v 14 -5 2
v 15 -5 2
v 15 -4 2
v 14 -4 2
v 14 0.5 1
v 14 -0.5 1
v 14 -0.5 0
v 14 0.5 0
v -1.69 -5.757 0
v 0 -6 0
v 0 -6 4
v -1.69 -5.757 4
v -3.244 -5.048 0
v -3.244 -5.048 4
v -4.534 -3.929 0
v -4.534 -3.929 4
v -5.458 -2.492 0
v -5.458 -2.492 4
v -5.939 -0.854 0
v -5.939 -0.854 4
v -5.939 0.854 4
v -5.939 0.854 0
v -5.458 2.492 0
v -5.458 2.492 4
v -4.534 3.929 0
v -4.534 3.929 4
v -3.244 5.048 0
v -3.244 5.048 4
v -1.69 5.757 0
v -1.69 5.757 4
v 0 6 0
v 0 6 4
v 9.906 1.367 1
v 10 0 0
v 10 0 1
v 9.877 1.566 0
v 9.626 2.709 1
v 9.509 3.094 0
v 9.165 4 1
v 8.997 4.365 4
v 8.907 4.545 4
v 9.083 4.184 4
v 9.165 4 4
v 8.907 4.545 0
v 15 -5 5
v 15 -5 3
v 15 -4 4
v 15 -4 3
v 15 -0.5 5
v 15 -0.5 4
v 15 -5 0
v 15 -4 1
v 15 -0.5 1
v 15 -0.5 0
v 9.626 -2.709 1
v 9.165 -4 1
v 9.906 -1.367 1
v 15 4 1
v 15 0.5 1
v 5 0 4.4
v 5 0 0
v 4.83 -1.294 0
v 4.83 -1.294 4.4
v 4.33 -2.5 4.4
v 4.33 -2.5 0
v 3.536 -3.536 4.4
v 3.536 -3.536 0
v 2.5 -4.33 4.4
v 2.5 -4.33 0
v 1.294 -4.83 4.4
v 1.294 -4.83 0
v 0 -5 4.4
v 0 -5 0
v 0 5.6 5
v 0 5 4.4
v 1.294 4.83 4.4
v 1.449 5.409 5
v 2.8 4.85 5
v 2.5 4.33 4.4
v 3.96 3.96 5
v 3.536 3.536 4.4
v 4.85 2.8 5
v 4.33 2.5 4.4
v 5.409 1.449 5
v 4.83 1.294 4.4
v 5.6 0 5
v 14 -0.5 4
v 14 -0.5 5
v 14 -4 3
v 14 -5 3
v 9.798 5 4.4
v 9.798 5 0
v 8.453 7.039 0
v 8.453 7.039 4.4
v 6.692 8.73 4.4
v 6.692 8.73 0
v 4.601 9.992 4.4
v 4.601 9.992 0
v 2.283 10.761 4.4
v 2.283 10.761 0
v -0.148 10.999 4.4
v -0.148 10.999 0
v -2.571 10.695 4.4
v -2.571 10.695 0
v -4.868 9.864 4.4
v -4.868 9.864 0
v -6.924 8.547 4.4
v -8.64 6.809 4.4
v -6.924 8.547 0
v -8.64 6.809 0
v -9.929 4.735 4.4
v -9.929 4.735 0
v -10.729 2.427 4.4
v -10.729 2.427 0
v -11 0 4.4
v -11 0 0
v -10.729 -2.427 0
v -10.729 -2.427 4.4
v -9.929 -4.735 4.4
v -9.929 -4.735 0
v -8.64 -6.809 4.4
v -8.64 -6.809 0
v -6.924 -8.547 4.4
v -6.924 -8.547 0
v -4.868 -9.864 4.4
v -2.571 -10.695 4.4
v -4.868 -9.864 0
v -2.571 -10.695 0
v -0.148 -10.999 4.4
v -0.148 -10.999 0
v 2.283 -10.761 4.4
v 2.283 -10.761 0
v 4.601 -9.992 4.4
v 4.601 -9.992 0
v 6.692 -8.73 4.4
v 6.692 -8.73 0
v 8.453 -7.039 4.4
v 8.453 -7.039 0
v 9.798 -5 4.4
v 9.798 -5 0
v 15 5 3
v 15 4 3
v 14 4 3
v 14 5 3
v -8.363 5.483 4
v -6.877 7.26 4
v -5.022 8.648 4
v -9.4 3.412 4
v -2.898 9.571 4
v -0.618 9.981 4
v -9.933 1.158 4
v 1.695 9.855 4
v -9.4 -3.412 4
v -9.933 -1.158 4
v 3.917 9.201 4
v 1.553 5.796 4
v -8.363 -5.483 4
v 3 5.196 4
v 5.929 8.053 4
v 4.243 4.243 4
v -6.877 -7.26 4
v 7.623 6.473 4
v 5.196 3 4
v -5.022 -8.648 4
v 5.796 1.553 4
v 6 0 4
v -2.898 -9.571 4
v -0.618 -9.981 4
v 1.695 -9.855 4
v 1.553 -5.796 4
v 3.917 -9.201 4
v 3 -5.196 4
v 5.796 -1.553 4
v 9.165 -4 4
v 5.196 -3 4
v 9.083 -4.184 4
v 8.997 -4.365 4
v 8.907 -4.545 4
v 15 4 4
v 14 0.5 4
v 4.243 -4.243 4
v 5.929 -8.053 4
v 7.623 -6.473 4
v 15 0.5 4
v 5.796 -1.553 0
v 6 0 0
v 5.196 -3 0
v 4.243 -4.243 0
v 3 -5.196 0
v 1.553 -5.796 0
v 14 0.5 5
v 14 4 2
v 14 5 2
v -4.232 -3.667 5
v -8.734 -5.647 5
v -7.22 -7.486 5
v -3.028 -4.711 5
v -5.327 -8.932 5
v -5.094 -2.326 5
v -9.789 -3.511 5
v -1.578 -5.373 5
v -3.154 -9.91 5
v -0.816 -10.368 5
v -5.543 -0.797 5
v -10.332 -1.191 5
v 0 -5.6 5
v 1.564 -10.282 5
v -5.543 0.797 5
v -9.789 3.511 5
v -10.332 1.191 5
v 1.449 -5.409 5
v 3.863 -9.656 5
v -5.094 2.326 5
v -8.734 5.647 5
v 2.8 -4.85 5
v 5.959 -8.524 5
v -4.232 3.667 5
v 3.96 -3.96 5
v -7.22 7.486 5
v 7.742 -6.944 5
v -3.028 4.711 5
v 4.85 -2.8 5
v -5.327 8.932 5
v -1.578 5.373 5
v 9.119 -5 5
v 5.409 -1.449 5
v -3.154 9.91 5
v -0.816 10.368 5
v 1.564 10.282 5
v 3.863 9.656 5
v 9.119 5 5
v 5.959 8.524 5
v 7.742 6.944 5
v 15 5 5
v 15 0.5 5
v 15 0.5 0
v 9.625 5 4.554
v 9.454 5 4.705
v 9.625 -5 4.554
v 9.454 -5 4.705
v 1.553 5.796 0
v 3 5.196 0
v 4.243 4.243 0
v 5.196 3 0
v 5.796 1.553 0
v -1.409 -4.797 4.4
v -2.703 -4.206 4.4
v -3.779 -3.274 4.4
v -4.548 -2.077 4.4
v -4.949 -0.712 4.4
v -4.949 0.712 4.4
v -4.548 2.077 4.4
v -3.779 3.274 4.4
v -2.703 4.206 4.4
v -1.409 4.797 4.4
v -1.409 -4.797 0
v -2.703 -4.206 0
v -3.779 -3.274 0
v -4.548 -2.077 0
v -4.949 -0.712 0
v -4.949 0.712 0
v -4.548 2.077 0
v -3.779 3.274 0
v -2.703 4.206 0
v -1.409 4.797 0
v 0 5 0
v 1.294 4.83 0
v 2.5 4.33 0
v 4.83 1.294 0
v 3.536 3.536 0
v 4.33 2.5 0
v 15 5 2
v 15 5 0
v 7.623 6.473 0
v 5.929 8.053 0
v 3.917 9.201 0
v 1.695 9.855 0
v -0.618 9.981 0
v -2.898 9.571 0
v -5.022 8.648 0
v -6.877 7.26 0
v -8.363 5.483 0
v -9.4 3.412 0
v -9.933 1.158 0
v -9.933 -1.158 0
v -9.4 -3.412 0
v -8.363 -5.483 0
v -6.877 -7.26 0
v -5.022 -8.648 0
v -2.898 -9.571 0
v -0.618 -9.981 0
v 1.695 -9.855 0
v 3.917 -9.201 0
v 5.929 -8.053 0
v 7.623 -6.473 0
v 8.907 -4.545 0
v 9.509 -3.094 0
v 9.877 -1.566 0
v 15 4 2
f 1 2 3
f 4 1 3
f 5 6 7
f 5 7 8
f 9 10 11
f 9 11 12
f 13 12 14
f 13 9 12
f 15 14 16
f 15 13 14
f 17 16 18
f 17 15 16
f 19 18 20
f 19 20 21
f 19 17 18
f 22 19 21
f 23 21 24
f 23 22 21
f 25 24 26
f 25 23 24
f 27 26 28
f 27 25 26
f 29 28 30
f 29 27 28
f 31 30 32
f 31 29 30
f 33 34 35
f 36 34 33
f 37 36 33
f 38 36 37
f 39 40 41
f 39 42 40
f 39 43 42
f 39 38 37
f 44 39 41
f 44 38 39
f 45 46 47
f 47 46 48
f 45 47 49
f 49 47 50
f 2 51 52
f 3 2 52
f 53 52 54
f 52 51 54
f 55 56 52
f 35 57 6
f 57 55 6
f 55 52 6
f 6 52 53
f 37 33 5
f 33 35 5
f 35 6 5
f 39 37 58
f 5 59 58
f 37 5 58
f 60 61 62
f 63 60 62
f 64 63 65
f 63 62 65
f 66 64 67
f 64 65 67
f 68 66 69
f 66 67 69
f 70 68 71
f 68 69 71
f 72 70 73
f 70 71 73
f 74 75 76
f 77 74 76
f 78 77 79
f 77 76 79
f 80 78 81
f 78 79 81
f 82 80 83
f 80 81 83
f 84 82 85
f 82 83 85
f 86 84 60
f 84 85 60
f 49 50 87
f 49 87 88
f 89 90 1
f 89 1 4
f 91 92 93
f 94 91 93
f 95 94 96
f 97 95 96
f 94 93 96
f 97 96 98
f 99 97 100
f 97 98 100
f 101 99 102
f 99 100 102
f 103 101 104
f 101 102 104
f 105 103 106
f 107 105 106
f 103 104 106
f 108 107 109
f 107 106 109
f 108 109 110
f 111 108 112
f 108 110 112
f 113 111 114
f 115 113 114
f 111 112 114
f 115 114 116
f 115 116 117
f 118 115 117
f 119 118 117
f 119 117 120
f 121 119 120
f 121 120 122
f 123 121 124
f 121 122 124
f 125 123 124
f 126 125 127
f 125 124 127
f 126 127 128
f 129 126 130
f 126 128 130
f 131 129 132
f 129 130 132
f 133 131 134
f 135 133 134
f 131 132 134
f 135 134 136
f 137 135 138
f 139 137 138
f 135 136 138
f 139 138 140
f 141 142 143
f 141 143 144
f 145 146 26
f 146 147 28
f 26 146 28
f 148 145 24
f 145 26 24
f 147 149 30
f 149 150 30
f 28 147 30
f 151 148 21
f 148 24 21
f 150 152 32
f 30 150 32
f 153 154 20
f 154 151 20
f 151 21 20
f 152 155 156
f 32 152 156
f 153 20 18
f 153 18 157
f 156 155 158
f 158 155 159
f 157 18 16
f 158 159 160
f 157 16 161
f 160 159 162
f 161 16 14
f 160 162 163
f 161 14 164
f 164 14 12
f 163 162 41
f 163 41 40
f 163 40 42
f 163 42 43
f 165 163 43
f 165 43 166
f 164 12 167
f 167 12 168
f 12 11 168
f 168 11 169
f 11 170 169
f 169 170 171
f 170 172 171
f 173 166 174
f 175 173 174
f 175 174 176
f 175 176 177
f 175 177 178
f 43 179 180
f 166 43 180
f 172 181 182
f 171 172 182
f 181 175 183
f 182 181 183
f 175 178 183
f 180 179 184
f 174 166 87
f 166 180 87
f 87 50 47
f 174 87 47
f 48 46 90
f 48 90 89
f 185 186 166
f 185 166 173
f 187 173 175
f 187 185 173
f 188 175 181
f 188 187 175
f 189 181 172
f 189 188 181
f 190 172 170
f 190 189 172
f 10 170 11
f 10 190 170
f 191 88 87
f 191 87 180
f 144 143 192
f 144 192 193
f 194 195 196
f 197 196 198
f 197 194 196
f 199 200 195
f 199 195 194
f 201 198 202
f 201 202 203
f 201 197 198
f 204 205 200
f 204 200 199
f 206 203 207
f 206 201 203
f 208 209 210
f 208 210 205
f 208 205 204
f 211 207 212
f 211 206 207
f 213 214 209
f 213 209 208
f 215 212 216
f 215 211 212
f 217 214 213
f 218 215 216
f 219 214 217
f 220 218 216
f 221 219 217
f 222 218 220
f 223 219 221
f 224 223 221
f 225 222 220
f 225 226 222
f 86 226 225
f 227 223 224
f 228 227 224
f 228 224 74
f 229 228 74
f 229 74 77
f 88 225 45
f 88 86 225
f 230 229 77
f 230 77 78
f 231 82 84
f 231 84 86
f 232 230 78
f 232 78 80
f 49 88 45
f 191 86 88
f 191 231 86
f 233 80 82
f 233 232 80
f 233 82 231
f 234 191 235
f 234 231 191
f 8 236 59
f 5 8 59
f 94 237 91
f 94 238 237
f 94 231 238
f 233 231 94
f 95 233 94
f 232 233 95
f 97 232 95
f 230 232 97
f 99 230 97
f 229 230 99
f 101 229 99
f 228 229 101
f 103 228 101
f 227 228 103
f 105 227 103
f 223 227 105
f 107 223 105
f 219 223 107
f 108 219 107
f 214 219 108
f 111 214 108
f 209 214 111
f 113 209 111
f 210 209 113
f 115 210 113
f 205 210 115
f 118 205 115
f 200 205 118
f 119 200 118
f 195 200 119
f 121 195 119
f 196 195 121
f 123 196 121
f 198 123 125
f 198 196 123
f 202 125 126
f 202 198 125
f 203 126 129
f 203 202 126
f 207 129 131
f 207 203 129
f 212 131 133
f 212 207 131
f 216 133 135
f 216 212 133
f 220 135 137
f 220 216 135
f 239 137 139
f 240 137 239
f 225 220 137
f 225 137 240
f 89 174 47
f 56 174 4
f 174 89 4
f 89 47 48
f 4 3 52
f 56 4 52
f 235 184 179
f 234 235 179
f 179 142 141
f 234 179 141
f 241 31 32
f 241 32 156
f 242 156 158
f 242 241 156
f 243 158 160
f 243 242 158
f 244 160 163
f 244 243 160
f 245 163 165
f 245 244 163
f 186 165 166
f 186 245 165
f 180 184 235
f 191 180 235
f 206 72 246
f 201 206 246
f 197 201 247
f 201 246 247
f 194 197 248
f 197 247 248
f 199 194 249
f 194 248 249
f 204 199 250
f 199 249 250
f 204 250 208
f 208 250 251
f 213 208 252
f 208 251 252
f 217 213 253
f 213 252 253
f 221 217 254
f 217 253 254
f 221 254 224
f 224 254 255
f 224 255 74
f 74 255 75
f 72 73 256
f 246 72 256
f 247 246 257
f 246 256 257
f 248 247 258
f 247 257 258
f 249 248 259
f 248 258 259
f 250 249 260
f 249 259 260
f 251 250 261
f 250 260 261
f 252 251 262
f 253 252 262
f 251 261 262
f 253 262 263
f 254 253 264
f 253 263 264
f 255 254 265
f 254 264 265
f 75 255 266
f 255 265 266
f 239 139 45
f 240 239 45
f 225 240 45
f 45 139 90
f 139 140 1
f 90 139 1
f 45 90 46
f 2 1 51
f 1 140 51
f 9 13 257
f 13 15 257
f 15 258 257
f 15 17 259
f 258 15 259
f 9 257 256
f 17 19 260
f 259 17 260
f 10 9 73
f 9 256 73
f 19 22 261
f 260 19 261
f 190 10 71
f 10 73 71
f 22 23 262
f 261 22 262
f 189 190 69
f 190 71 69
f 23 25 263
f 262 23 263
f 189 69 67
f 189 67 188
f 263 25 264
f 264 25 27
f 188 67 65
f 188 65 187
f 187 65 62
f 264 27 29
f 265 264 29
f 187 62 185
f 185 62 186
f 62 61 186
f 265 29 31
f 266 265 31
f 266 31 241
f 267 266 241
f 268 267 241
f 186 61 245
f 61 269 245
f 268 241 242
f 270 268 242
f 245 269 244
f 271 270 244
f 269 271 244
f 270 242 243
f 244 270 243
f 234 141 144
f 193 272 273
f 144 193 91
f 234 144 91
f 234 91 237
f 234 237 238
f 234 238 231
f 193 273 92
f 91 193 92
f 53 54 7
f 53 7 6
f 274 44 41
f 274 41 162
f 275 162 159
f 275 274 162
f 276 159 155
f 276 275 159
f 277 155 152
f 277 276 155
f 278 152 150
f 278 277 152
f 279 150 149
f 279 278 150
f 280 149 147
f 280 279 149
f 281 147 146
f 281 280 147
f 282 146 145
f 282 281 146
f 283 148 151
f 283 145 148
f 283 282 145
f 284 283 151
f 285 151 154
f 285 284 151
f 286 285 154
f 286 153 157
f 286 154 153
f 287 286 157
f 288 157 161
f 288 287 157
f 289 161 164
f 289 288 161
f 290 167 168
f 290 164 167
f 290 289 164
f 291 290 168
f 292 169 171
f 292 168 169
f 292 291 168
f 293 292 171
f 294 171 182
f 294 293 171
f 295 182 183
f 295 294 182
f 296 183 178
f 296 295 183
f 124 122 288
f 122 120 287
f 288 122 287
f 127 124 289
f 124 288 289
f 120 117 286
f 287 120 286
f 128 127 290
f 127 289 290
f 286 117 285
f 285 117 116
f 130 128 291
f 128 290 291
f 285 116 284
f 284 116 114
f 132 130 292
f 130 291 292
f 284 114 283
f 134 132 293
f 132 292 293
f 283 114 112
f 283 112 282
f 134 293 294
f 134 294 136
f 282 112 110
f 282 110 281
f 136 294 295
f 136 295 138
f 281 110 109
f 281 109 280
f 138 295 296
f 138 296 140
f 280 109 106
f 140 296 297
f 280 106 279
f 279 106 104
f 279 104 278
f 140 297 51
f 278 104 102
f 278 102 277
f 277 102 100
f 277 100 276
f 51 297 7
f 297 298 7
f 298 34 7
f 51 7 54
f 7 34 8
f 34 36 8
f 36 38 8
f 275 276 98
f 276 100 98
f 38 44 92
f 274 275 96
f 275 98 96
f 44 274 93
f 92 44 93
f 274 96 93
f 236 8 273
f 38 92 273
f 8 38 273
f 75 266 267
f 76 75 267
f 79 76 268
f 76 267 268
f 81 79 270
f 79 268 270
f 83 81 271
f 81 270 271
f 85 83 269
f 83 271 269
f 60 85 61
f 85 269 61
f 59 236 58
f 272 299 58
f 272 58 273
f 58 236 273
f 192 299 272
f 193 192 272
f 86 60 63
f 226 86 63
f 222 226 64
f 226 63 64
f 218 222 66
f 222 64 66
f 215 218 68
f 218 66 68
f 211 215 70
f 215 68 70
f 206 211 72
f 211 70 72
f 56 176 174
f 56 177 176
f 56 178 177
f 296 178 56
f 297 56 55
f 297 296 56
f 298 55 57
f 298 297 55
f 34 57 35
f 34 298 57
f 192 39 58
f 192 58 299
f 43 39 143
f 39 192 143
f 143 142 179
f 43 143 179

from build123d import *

# Parameters (mm, degrees)
F1_DEPTH = 5
F2_T     = -1
F3_DEPTH = 5
F5_DEPTH = 5.8358486101
F6_SIZE  = 0.6
F4_W     = 1
F4_H     = 1
F7_DEPTH = 1


with BuildPart() as f1:
    # F0 (on Top) → F1 (new body)
    with BuildSketch(Plane.XY):
        with BuildLine():
            ThreePointArc((0, -5), (-5, 0), (0, 5))
            Line((0, 5), (9.7979589711, 5))
            ThreePointArc((9.7979589711, 5), (-11, 0), (9.7979589711, -5))
            Line((9.7979589711, -5), (0, -5))
        make_face()
        with BuildLine():
            ThreePointArc((0, 5), (3.5355339059, 3.5355339059), (5, 0))
            ThreePointArc((5, 0), (3.5355339059, -3.5355339059), (0, -5))
            Line((0, -5), (9.7979589711, -5))
            ThreePointArc((9.7979589711, -5), (10.695268783, -2.5712303784), (11, 0))
            ThreePointArc((11, 0), (10.695268783, 2.5712303784), (9.7979589711, 5))
            Line((9.7979589711, 5), (0, 5))
        make_face()
    extrude(amount=F1_DEPTH)

    # F2
    f2_openings = [f1.faces().sort_by_distance(p)[0] for p in [
        (-9.520831, 4.858579, 0),
    ]]
    offset(amount=F2_T, openings=f2_openings)

    # F0 (on Top) → F3 (join)
    with BuildSketch(Plane.XY):
        with BuildLine():
            Line((15, 5), (9.7979589711, 5))
            ThreePointArc((9.7979589711, 5), (10.695268783, 2.5712303784), (11, 0))
            ThreePointArc((11, 0), (10.695268783, -2.5712303784), (9.7979589711, -5))
            Line((9.7979589711, -5), (15, -5))
            Line((15, -5), (15, 5))
        make_face()
    extrude(amount=F3_DEPTH)

    # F4 (on face) → F5 (cut, through all)
    with BuildSketch(Plane.YZ.offset(15)):
        Polygon((-4, 2), (-4, 1), (-0.5, 1), (0.5, 1), (4, 1), (4, 2), (4, 3), (4, 4), (0.5, 4), (-0.5, 4), (-4, 4), (-4, 3), align=None)
    extrude(amount=-F5_DEPTH, mode=Mode.SUBTRACT)

    # F6
    f6_edges = [f1.edges().sort_by_distance(p)[0] for p in [
        (-11, 0, 5),
        (0, -5, 5),
    ]]
    chamfer(f6_edges, length=F6_SIZE)

    # F4 (on face) → F7 (cut)
    with BuildSketch(Plane.YZ.offset(15)):
        with Locations((0, 4.5)):
            Rectangle(F4_W, F4_H)
        with Locations((-4.5, 2.5)):
            Rectangle(F4_W, F4_H)
        with Locations((0, 0.5)):
            Rectangle(F4_W, F4_H)
        with Locations((4.5, 2.5)):
            Rectangle(F4_W, F4_H)
    extrude(amount=-F7_DEPTH, mode=Mode.SUBTRACT)


solid = f1.part
